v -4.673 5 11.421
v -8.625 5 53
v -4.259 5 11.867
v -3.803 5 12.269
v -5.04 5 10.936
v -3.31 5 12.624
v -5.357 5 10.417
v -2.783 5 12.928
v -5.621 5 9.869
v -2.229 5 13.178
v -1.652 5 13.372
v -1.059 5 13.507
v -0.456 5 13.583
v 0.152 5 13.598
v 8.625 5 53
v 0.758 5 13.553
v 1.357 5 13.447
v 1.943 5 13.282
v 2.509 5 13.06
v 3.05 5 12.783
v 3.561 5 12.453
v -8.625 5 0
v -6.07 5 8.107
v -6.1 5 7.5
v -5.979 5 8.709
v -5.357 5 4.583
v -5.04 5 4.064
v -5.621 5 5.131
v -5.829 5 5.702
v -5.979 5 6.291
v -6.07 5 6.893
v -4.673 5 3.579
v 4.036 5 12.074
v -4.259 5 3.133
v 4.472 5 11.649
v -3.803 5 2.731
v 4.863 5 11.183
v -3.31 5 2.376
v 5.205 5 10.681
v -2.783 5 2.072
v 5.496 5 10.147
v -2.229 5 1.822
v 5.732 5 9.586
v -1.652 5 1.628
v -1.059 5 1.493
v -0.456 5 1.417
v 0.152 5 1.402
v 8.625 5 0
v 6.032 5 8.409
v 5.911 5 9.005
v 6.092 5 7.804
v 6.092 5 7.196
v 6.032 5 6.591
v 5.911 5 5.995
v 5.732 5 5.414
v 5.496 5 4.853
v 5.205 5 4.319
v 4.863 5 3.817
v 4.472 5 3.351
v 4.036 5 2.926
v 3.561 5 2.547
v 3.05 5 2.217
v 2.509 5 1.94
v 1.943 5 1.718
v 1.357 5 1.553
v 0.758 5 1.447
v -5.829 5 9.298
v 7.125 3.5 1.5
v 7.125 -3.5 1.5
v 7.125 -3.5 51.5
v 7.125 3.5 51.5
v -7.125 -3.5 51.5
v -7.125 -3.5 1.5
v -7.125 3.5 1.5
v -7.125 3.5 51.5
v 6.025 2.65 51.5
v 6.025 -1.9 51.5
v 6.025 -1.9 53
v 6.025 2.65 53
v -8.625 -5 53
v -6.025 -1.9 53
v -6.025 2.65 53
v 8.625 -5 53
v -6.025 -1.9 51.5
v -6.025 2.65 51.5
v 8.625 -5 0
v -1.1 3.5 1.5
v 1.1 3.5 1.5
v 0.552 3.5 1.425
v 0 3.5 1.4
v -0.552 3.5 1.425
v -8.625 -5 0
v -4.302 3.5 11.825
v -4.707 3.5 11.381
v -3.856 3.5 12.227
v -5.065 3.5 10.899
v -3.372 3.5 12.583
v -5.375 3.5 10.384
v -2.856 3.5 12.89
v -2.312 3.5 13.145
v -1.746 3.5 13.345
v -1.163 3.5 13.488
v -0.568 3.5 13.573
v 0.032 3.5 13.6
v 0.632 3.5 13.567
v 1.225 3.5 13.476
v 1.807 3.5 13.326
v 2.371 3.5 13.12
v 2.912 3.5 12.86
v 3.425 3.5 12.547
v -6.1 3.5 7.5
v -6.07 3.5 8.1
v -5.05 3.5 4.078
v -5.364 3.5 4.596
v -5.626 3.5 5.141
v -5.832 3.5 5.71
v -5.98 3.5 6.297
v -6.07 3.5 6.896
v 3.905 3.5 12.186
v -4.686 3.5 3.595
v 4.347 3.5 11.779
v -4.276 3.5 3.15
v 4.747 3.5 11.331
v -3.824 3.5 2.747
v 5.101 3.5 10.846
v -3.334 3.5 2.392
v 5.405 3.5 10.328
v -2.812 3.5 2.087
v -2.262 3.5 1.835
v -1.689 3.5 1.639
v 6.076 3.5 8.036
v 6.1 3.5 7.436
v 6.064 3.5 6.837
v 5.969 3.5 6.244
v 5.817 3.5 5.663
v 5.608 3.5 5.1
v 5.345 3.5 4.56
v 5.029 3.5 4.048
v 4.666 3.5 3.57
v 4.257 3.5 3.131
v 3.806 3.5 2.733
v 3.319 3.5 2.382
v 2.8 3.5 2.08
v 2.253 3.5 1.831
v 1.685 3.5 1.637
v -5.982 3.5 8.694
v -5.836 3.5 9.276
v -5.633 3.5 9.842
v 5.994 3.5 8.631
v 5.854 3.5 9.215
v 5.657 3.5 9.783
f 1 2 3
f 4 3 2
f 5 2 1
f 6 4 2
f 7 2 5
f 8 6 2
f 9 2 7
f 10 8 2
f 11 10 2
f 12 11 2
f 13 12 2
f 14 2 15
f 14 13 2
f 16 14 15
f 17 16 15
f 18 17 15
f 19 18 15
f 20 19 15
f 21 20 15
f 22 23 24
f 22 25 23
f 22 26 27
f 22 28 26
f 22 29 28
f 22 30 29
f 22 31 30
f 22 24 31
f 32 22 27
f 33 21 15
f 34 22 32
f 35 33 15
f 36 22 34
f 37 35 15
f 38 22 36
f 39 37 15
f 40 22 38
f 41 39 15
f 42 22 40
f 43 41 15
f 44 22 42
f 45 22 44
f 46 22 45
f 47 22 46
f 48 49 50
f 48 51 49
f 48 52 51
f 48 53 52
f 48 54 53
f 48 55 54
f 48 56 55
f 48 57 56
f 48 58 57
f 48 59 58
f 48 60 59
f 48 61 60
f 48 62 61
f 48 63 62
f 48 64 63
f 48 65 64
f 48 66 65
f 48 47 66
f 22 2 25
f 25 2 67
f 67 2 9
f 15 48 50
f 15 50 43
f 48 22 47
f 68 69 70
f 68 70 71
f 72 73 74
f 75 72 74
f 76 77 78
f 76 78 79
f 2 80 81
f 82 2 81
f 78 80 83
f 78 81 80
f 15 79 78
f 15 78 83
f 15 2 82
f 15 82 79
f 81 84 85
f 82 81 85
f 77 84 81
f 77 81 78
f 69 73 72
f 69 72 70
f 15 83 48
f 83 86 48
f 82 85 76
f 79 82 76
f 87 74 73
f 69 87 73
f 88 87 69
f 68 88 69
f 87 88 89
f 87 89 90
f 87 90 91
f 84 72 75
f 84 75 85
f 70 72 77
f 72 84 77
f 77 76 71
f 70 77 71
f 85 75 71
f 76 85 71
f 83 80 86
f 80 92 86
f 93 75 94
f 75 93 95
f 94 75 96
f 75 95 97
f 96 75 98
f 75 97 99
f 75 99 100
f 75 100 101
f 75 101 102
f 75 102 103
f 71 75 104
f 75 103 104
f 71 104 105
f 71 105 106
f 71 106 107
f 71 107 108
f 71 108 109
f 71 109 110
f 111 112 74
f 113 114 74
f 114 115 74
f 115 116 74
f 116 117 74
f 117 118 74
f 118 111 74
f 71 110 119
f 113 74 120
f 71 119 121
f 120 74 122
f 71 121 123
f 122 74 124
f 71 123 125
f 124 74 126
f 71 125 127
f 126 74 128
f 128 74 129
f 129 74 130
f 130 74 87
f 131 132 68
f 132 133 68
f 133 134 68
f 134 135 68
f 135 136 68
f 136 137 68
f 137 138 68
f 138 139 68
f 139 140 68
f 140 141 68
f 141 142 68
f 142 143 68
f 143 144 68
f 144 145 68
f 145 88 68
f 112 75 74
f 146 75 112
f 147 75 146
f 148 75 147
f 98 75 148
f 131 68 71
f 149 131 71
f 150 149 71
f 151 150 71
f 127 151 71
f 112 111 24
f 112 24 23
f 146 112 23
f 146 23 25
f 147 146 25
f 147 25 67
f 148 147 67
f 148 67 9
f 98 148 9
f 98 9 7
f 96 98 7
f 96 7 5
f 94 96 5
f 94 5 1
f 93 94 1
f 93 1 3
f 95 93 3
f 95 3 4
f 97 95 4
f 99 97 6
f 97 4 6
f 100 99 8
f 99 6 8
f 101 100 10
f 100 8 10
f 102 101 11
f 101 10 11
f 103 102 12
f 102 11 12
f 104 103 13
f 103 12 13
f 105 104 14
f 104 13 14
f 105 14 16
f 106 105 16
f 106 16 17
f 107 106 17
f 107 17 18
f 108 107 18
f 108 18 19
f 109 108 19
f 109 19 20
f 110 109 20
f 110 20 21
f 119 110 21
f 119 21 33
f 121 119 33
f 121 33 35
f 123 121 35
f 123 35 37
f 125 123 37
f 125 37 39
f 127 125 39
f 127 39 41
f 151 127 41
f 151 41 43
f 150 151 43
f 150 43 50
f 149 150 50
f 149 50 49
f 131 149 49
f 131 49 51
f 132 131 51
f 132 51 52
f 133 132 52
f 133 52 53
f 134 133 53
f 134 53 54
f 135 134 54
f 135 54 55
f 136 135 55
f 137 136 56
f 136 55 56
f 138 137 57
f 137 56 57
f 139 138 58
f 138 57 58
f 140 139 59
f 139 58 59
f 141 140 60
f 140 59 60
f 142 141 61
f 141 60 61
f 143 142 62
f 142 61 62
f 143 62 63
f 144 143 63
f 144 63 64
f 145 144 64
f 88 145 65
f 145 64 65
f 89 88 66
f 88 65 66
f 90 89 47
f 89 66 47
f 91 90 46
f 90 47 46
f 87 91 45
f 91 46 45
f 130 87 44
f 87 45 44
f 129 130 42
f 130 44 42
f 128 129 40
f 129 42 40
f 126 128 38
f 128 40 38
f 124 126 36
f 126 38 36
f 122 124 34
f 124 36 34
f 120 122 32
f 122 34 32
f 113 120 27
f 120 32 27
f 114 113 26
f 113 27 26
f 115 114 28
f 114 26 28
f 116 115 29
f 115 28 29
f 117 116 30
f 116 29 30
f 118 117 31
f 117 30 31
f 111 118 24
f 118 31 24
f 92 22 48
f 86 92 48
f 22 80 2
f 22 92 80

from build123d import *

# Parameters (mm, degrees)
SKETCH_W      = 17.25
SKETCH_H      = 10
PAD_DEPTH     = 1.5
SKETCH001_W   = 17.25
SKETCH001_H   = 10
SKETCH001_W_2 = 14.25
SKETCH001_H_2 = 7
PAD001_DEPTH  = 50
SKETCH002_R   = 6.1
POCKET_DEPTH  = 1.5
SKETCH003_W   = 17.25
SKETCH003_H   = 10
SKETCH003_W_2 = 12.05
SKETCH003_H_2 = 4.55
PAD002_DEPTH  = 1.5


with BuildPart() as part:
    # Sketch → Pad (new body)
    with BuildSketch(Plane.XY):
        Rectangle(SKETCH_W, SKETCH_H)
    extrude(amount=PAD_DEPTH)

    # Sketch001 (on Face6 of Pad) → Pad001 (join)
    with BuildSketch(Plane.XY.offset(1.5)):
        Rectangle(SKETCH001_W, SKETCH001_H)
        Rectangle(SKETCH001_W_2, SKETCH001_H_2, mode=Mode.SUBTRACT)
    extrude(amount=PAD001_DEPTH)

    # Sketch002 (on Face6 of Pad001) → Pocket (cut)
    with BuildSketch(Plane(origin=(0, 5, 0), x_dir=(-1, 0, 0), z_dir=(0, 1, 0))):
        with Locations((0, 7.5)):
            Circle(SKETCH002_R)
    extrude(amount=-POCKET_DEPTH, mode=Mode.SUBTRACT)

    # Sketch003 (on Face11 of Pocket) → Pad002 (join)
    with BuildSketch(Plane.XY.offset(51.5)):
        Rectangle(SKETCH003_W, SKETCH003_H)
        with Locations((0, 0.375)):
            Rectangle(SKETCH003_W_2, SKETCH003_H_2, mode=Mode.SUBTRACT)
    extrude(amount=PAD002_DEPTH)


solid = part.part
